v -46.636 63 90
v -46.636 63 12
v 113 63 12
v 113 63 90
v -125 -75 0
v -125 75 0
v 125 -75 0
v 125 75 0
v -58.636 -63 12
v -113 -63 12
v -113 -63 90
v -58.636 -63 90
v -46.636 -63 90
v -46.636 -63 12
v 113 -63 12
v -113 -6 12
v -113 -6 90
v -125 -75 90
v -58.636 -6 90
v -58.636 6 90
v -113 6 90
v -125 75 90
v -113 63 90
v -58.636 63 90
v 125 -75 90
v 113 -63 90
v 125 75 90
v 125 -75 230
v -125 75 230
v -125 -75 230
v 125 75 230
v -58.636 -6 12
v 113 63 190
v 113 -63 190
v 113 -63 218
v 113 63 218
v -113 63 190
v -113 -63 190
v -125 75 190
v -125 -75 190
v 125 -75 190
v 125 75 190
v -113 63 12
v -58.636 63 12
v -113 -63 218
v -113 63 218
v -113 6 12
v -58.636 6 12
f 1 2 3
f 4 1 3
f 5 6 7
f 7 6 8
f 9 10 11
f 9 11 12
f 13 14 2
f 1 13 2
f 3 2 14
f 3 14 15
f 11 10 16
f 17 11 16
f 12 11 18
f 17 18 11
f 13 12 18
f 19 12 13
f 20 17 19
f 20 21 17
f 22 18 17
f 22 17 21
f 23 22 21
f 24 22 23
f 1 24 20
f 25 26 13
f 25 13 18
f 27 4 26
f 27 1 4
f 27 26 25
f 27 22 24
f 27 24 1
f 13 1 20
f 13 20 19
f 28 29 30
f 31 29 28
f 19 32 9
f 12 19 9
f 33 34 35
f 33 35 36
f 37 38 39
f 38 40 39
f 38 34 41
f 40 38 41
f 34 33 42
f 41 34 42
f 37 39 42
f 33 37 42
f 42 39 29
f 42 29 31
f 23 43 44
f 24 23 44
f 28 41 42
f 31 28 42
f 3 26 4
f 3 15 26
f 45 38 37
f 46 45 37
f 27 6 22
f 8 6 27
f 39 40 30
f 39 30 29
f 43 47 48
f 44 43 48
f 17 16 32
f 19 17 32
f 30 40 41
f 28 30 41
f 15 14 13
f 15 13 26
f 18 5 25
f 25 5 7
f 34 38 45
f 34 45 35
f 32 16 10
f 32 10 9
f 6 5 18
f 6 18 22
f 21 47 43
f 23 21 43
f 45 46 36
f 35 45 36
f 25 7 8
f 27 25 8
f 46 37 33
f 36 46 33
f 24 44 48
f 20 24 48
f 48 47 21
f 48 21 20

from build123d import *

# Parameters (mm, degrees)
F0_W     = 250
F0_H     = 150
F1_DEPTH = 90
F2_T     = -12
F3_W     = 54.3636363636
F3_H     = 12
F3_W_2   = 5.5963844467
F4_DEPTH = 78
F6_W     = 250
F6_H     = 150
F7_DEPTH = 40
F8_T     = -12


with BuildPart() as f1:
    # F0 (on Top) → F1 (new body)
    with BuildSketch(Plane.XY):
        Rectangle(F0_W, F0_H)
    extrude(amount=F1_DEPTH)

    # F2
    f2_openings = [f1.faces().sort_by_distance(p)[0] for p in [
        (0, 0, 90),
    ]]
    offset(amount=F2_T, openings=f2_openings)

    # F3 (on face) → F4 (join)
    with BuildSketch(Plane.XY.offset(12)):
        with Locations((-85.8181818182, 0)):
            Rectangle(F3_W, F3_H)
        Polygon((-46.6363636364, -63), (-46.6363636364, 63), (-58.6363636364, 63), (-58.6363636364, 6), (-53.0399791896, 6), (-53.0399791896, -6), (-58.6363636364, -6), (-58.6363636364, -63), align=None)
        with Locations((-55.838171413, 0)):
            Rectangle(F3_W_2, F3_H)
    extrude(amount=F4_DEPTH)


with BuildPart() as f7:
    # F6 (on offset) → F7 (new body)
    with BuildSketch(Plane.XY.offset(190)):
        Rectangle(F6_W, F6_H)
    extrude(amount=F7_DEPTH)

    # F8
    f8_openings = [f7.faces().sort_by_distance(p)[0] for p in [
        (0, 0, 190),
    ]]
    offset(amount=F8_T, openings=f8_openings)


solid = Compound([f1.part, f7.part])
